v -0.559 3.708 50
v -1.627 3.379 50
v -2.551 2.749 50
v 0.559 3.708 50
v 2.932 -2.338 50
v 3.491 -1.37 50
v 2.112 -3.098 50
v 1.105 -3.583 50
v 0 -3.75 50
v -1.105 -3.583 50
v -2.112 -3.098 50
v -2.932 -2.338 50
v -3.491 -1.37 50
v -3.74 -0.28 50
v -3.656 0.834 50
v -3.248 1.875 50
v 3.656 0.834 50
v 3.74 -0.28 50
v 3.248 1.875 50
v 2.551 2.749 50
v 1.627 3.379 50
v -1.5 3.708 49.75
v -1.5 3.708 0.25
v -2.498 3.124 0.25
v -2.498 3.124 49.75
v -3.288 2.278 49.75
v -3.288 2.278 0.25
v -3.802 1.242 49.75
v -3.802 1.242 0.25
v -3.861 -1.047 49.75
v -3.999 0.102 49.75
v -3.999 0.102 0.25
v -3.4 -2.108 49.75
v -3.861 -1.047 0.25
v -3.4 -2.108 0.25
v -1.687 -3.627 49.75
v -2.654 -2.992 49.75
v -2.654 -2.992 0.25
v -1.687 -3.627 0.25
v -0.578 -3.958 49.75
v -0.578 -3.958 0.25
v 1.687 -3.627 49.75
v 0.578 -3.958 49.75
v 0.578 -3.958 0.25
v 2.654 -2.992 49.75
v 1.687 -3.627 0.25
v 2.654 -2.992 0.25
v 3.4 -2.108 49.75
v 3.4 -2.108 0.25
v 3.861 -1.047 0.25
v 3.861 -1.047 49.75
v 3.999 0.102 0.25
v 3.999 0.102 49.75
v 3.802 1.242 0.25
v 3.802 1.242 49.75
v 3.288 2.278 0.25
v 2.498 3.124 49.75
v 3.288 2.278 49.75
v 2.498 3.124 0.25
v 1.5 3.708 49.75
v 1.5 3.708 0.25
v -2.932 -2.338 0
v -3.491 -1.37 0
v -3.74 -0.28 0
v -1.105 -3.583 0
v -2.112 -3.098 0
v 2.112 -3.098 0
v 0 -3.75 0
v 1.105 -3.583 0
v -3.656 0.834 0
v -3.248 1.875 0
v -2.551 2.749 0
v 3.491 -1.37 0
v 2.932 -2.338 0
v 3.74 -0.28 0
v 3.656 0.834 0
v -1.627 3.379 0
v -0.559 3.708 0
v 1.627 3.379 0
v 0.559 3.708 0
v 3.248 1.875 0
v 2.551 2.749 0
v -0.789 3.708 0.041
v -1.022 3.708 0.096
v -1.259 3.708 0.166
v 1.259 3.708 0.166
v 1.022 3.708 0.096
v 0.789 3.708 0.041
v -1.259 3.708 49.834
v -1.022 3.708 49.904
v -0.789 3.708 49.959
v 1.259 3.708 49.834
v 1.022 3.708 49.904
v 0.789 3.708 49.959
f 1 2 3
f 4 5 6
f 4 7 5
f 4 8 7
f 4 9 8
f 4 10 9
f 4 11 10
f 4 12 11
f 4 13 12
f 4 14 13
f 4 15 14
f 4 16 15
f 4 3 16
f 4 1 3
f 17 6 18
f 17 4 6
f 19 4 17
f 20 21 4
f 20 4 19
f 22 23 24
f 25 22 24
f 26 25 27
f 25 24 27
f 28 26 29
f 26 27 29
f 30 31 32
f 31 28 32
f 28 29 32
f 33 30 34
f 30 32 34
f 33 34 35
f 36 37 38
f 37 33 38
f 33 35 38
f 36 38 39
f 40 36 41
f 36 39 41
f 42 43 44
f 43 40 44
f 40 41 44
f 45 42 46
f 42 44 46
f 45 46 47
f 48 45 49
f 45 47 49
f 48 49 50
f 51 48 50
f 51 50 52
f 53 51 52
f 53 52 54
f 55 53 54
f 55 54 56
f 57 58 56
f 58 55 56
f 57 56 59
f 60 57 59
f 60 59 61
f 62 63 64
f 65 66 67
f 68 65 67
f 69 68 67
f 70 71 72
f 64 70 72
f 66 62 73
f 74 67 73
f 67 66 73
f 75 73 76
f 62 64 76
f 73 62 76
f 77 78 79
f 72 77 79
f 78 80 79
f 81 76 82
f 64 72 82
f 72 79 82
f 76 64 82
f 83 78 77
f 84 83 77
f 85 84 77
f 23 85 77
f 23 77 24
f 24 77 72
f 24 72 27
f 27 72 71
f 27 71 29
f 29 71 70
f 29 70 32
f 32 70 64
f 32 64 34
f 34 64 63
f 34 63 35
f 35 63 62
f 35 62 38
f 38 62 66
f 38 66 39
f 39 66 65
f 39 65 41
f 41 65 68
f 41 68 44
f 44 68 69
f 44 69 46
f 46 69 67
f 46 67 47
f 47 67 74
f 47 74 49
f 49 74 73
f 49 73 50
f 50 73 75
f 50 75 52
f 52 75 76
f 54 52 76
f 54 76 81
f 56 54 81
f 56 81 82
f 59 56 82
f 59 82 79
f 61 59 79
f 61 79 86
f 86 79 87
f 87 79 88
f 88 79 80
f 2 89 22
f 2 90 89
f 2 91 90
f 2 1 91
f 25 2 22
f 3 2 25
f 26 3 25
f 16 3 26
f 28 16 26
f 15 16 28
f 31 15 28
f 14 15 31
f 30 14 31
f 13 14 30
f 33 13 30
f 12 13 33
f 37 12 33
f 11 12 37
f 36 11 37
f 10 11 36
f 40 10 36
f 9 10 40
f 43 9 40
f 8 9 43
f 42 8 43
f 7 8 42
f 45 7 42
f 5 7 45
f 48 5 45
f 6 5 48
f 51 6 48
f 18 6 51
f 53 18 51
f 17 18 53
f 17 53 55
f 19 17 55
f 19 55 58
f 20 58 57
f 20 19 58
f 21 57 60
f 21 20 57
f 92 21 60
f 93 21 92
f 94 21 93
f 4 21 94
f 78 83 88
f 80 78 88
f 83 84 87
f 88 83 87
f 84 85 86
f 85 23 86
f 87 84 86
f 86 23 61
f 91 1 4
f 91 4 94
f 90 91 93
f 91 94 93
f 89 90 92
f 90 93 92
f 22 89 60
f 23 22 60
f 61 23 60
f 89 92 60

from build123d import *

# Parameters (mm, degrees)
SKETCH1_R           = 4
BOSS_EXTRUDE1_DEPTH = 50
CHAMFER1_SIZE       = 0.25
CHAMFER2_SIZE       = 0.25
CUT_EXTRUDE2_DEPTH  = 51.318982502


with BuildPart() as part:
    # Sketch1 → Boss-Extrude1 (new body)
    with BuildSketch(Plane.XY):
        Circle(SKETCH1_R)
    extrude(amount=BOSS_EXTRUDE1_DEPTH)

    # Chamfer1
    chamfer1_edges = [part.edges().sort_by_distance(p)[0] for p in [
        (-4, 0, 50),
    ]]
    chamfer(chamfer1_edges, length=CHAMFER1_SIZE)

    # Chamfer2
    chamfer2_edges = [part.edges().sort_by_distance(p)[0] for p in [
        (-4, 0, 0),
    ]]
    chamfer(chamfer2_edges, length=CHAMFER2_SIZE)

    # Sketch4 → Cut-Extrude2 (cut, through all)
    with BuildSketch(Plane.XY.offset(50)):
        with BuildLine():
            Line((-1.5, 3.708099244), (1.5, 3.708099244))
            ThreePointArc((1.5, 3.708099244), (0, 4), (-1.5, 3.708099244))
        make_face()
    extrude(amount=-CUT_EXTRUDE2_DEPTH, mode=Mode.SUBTRACT)


solid = part.part
